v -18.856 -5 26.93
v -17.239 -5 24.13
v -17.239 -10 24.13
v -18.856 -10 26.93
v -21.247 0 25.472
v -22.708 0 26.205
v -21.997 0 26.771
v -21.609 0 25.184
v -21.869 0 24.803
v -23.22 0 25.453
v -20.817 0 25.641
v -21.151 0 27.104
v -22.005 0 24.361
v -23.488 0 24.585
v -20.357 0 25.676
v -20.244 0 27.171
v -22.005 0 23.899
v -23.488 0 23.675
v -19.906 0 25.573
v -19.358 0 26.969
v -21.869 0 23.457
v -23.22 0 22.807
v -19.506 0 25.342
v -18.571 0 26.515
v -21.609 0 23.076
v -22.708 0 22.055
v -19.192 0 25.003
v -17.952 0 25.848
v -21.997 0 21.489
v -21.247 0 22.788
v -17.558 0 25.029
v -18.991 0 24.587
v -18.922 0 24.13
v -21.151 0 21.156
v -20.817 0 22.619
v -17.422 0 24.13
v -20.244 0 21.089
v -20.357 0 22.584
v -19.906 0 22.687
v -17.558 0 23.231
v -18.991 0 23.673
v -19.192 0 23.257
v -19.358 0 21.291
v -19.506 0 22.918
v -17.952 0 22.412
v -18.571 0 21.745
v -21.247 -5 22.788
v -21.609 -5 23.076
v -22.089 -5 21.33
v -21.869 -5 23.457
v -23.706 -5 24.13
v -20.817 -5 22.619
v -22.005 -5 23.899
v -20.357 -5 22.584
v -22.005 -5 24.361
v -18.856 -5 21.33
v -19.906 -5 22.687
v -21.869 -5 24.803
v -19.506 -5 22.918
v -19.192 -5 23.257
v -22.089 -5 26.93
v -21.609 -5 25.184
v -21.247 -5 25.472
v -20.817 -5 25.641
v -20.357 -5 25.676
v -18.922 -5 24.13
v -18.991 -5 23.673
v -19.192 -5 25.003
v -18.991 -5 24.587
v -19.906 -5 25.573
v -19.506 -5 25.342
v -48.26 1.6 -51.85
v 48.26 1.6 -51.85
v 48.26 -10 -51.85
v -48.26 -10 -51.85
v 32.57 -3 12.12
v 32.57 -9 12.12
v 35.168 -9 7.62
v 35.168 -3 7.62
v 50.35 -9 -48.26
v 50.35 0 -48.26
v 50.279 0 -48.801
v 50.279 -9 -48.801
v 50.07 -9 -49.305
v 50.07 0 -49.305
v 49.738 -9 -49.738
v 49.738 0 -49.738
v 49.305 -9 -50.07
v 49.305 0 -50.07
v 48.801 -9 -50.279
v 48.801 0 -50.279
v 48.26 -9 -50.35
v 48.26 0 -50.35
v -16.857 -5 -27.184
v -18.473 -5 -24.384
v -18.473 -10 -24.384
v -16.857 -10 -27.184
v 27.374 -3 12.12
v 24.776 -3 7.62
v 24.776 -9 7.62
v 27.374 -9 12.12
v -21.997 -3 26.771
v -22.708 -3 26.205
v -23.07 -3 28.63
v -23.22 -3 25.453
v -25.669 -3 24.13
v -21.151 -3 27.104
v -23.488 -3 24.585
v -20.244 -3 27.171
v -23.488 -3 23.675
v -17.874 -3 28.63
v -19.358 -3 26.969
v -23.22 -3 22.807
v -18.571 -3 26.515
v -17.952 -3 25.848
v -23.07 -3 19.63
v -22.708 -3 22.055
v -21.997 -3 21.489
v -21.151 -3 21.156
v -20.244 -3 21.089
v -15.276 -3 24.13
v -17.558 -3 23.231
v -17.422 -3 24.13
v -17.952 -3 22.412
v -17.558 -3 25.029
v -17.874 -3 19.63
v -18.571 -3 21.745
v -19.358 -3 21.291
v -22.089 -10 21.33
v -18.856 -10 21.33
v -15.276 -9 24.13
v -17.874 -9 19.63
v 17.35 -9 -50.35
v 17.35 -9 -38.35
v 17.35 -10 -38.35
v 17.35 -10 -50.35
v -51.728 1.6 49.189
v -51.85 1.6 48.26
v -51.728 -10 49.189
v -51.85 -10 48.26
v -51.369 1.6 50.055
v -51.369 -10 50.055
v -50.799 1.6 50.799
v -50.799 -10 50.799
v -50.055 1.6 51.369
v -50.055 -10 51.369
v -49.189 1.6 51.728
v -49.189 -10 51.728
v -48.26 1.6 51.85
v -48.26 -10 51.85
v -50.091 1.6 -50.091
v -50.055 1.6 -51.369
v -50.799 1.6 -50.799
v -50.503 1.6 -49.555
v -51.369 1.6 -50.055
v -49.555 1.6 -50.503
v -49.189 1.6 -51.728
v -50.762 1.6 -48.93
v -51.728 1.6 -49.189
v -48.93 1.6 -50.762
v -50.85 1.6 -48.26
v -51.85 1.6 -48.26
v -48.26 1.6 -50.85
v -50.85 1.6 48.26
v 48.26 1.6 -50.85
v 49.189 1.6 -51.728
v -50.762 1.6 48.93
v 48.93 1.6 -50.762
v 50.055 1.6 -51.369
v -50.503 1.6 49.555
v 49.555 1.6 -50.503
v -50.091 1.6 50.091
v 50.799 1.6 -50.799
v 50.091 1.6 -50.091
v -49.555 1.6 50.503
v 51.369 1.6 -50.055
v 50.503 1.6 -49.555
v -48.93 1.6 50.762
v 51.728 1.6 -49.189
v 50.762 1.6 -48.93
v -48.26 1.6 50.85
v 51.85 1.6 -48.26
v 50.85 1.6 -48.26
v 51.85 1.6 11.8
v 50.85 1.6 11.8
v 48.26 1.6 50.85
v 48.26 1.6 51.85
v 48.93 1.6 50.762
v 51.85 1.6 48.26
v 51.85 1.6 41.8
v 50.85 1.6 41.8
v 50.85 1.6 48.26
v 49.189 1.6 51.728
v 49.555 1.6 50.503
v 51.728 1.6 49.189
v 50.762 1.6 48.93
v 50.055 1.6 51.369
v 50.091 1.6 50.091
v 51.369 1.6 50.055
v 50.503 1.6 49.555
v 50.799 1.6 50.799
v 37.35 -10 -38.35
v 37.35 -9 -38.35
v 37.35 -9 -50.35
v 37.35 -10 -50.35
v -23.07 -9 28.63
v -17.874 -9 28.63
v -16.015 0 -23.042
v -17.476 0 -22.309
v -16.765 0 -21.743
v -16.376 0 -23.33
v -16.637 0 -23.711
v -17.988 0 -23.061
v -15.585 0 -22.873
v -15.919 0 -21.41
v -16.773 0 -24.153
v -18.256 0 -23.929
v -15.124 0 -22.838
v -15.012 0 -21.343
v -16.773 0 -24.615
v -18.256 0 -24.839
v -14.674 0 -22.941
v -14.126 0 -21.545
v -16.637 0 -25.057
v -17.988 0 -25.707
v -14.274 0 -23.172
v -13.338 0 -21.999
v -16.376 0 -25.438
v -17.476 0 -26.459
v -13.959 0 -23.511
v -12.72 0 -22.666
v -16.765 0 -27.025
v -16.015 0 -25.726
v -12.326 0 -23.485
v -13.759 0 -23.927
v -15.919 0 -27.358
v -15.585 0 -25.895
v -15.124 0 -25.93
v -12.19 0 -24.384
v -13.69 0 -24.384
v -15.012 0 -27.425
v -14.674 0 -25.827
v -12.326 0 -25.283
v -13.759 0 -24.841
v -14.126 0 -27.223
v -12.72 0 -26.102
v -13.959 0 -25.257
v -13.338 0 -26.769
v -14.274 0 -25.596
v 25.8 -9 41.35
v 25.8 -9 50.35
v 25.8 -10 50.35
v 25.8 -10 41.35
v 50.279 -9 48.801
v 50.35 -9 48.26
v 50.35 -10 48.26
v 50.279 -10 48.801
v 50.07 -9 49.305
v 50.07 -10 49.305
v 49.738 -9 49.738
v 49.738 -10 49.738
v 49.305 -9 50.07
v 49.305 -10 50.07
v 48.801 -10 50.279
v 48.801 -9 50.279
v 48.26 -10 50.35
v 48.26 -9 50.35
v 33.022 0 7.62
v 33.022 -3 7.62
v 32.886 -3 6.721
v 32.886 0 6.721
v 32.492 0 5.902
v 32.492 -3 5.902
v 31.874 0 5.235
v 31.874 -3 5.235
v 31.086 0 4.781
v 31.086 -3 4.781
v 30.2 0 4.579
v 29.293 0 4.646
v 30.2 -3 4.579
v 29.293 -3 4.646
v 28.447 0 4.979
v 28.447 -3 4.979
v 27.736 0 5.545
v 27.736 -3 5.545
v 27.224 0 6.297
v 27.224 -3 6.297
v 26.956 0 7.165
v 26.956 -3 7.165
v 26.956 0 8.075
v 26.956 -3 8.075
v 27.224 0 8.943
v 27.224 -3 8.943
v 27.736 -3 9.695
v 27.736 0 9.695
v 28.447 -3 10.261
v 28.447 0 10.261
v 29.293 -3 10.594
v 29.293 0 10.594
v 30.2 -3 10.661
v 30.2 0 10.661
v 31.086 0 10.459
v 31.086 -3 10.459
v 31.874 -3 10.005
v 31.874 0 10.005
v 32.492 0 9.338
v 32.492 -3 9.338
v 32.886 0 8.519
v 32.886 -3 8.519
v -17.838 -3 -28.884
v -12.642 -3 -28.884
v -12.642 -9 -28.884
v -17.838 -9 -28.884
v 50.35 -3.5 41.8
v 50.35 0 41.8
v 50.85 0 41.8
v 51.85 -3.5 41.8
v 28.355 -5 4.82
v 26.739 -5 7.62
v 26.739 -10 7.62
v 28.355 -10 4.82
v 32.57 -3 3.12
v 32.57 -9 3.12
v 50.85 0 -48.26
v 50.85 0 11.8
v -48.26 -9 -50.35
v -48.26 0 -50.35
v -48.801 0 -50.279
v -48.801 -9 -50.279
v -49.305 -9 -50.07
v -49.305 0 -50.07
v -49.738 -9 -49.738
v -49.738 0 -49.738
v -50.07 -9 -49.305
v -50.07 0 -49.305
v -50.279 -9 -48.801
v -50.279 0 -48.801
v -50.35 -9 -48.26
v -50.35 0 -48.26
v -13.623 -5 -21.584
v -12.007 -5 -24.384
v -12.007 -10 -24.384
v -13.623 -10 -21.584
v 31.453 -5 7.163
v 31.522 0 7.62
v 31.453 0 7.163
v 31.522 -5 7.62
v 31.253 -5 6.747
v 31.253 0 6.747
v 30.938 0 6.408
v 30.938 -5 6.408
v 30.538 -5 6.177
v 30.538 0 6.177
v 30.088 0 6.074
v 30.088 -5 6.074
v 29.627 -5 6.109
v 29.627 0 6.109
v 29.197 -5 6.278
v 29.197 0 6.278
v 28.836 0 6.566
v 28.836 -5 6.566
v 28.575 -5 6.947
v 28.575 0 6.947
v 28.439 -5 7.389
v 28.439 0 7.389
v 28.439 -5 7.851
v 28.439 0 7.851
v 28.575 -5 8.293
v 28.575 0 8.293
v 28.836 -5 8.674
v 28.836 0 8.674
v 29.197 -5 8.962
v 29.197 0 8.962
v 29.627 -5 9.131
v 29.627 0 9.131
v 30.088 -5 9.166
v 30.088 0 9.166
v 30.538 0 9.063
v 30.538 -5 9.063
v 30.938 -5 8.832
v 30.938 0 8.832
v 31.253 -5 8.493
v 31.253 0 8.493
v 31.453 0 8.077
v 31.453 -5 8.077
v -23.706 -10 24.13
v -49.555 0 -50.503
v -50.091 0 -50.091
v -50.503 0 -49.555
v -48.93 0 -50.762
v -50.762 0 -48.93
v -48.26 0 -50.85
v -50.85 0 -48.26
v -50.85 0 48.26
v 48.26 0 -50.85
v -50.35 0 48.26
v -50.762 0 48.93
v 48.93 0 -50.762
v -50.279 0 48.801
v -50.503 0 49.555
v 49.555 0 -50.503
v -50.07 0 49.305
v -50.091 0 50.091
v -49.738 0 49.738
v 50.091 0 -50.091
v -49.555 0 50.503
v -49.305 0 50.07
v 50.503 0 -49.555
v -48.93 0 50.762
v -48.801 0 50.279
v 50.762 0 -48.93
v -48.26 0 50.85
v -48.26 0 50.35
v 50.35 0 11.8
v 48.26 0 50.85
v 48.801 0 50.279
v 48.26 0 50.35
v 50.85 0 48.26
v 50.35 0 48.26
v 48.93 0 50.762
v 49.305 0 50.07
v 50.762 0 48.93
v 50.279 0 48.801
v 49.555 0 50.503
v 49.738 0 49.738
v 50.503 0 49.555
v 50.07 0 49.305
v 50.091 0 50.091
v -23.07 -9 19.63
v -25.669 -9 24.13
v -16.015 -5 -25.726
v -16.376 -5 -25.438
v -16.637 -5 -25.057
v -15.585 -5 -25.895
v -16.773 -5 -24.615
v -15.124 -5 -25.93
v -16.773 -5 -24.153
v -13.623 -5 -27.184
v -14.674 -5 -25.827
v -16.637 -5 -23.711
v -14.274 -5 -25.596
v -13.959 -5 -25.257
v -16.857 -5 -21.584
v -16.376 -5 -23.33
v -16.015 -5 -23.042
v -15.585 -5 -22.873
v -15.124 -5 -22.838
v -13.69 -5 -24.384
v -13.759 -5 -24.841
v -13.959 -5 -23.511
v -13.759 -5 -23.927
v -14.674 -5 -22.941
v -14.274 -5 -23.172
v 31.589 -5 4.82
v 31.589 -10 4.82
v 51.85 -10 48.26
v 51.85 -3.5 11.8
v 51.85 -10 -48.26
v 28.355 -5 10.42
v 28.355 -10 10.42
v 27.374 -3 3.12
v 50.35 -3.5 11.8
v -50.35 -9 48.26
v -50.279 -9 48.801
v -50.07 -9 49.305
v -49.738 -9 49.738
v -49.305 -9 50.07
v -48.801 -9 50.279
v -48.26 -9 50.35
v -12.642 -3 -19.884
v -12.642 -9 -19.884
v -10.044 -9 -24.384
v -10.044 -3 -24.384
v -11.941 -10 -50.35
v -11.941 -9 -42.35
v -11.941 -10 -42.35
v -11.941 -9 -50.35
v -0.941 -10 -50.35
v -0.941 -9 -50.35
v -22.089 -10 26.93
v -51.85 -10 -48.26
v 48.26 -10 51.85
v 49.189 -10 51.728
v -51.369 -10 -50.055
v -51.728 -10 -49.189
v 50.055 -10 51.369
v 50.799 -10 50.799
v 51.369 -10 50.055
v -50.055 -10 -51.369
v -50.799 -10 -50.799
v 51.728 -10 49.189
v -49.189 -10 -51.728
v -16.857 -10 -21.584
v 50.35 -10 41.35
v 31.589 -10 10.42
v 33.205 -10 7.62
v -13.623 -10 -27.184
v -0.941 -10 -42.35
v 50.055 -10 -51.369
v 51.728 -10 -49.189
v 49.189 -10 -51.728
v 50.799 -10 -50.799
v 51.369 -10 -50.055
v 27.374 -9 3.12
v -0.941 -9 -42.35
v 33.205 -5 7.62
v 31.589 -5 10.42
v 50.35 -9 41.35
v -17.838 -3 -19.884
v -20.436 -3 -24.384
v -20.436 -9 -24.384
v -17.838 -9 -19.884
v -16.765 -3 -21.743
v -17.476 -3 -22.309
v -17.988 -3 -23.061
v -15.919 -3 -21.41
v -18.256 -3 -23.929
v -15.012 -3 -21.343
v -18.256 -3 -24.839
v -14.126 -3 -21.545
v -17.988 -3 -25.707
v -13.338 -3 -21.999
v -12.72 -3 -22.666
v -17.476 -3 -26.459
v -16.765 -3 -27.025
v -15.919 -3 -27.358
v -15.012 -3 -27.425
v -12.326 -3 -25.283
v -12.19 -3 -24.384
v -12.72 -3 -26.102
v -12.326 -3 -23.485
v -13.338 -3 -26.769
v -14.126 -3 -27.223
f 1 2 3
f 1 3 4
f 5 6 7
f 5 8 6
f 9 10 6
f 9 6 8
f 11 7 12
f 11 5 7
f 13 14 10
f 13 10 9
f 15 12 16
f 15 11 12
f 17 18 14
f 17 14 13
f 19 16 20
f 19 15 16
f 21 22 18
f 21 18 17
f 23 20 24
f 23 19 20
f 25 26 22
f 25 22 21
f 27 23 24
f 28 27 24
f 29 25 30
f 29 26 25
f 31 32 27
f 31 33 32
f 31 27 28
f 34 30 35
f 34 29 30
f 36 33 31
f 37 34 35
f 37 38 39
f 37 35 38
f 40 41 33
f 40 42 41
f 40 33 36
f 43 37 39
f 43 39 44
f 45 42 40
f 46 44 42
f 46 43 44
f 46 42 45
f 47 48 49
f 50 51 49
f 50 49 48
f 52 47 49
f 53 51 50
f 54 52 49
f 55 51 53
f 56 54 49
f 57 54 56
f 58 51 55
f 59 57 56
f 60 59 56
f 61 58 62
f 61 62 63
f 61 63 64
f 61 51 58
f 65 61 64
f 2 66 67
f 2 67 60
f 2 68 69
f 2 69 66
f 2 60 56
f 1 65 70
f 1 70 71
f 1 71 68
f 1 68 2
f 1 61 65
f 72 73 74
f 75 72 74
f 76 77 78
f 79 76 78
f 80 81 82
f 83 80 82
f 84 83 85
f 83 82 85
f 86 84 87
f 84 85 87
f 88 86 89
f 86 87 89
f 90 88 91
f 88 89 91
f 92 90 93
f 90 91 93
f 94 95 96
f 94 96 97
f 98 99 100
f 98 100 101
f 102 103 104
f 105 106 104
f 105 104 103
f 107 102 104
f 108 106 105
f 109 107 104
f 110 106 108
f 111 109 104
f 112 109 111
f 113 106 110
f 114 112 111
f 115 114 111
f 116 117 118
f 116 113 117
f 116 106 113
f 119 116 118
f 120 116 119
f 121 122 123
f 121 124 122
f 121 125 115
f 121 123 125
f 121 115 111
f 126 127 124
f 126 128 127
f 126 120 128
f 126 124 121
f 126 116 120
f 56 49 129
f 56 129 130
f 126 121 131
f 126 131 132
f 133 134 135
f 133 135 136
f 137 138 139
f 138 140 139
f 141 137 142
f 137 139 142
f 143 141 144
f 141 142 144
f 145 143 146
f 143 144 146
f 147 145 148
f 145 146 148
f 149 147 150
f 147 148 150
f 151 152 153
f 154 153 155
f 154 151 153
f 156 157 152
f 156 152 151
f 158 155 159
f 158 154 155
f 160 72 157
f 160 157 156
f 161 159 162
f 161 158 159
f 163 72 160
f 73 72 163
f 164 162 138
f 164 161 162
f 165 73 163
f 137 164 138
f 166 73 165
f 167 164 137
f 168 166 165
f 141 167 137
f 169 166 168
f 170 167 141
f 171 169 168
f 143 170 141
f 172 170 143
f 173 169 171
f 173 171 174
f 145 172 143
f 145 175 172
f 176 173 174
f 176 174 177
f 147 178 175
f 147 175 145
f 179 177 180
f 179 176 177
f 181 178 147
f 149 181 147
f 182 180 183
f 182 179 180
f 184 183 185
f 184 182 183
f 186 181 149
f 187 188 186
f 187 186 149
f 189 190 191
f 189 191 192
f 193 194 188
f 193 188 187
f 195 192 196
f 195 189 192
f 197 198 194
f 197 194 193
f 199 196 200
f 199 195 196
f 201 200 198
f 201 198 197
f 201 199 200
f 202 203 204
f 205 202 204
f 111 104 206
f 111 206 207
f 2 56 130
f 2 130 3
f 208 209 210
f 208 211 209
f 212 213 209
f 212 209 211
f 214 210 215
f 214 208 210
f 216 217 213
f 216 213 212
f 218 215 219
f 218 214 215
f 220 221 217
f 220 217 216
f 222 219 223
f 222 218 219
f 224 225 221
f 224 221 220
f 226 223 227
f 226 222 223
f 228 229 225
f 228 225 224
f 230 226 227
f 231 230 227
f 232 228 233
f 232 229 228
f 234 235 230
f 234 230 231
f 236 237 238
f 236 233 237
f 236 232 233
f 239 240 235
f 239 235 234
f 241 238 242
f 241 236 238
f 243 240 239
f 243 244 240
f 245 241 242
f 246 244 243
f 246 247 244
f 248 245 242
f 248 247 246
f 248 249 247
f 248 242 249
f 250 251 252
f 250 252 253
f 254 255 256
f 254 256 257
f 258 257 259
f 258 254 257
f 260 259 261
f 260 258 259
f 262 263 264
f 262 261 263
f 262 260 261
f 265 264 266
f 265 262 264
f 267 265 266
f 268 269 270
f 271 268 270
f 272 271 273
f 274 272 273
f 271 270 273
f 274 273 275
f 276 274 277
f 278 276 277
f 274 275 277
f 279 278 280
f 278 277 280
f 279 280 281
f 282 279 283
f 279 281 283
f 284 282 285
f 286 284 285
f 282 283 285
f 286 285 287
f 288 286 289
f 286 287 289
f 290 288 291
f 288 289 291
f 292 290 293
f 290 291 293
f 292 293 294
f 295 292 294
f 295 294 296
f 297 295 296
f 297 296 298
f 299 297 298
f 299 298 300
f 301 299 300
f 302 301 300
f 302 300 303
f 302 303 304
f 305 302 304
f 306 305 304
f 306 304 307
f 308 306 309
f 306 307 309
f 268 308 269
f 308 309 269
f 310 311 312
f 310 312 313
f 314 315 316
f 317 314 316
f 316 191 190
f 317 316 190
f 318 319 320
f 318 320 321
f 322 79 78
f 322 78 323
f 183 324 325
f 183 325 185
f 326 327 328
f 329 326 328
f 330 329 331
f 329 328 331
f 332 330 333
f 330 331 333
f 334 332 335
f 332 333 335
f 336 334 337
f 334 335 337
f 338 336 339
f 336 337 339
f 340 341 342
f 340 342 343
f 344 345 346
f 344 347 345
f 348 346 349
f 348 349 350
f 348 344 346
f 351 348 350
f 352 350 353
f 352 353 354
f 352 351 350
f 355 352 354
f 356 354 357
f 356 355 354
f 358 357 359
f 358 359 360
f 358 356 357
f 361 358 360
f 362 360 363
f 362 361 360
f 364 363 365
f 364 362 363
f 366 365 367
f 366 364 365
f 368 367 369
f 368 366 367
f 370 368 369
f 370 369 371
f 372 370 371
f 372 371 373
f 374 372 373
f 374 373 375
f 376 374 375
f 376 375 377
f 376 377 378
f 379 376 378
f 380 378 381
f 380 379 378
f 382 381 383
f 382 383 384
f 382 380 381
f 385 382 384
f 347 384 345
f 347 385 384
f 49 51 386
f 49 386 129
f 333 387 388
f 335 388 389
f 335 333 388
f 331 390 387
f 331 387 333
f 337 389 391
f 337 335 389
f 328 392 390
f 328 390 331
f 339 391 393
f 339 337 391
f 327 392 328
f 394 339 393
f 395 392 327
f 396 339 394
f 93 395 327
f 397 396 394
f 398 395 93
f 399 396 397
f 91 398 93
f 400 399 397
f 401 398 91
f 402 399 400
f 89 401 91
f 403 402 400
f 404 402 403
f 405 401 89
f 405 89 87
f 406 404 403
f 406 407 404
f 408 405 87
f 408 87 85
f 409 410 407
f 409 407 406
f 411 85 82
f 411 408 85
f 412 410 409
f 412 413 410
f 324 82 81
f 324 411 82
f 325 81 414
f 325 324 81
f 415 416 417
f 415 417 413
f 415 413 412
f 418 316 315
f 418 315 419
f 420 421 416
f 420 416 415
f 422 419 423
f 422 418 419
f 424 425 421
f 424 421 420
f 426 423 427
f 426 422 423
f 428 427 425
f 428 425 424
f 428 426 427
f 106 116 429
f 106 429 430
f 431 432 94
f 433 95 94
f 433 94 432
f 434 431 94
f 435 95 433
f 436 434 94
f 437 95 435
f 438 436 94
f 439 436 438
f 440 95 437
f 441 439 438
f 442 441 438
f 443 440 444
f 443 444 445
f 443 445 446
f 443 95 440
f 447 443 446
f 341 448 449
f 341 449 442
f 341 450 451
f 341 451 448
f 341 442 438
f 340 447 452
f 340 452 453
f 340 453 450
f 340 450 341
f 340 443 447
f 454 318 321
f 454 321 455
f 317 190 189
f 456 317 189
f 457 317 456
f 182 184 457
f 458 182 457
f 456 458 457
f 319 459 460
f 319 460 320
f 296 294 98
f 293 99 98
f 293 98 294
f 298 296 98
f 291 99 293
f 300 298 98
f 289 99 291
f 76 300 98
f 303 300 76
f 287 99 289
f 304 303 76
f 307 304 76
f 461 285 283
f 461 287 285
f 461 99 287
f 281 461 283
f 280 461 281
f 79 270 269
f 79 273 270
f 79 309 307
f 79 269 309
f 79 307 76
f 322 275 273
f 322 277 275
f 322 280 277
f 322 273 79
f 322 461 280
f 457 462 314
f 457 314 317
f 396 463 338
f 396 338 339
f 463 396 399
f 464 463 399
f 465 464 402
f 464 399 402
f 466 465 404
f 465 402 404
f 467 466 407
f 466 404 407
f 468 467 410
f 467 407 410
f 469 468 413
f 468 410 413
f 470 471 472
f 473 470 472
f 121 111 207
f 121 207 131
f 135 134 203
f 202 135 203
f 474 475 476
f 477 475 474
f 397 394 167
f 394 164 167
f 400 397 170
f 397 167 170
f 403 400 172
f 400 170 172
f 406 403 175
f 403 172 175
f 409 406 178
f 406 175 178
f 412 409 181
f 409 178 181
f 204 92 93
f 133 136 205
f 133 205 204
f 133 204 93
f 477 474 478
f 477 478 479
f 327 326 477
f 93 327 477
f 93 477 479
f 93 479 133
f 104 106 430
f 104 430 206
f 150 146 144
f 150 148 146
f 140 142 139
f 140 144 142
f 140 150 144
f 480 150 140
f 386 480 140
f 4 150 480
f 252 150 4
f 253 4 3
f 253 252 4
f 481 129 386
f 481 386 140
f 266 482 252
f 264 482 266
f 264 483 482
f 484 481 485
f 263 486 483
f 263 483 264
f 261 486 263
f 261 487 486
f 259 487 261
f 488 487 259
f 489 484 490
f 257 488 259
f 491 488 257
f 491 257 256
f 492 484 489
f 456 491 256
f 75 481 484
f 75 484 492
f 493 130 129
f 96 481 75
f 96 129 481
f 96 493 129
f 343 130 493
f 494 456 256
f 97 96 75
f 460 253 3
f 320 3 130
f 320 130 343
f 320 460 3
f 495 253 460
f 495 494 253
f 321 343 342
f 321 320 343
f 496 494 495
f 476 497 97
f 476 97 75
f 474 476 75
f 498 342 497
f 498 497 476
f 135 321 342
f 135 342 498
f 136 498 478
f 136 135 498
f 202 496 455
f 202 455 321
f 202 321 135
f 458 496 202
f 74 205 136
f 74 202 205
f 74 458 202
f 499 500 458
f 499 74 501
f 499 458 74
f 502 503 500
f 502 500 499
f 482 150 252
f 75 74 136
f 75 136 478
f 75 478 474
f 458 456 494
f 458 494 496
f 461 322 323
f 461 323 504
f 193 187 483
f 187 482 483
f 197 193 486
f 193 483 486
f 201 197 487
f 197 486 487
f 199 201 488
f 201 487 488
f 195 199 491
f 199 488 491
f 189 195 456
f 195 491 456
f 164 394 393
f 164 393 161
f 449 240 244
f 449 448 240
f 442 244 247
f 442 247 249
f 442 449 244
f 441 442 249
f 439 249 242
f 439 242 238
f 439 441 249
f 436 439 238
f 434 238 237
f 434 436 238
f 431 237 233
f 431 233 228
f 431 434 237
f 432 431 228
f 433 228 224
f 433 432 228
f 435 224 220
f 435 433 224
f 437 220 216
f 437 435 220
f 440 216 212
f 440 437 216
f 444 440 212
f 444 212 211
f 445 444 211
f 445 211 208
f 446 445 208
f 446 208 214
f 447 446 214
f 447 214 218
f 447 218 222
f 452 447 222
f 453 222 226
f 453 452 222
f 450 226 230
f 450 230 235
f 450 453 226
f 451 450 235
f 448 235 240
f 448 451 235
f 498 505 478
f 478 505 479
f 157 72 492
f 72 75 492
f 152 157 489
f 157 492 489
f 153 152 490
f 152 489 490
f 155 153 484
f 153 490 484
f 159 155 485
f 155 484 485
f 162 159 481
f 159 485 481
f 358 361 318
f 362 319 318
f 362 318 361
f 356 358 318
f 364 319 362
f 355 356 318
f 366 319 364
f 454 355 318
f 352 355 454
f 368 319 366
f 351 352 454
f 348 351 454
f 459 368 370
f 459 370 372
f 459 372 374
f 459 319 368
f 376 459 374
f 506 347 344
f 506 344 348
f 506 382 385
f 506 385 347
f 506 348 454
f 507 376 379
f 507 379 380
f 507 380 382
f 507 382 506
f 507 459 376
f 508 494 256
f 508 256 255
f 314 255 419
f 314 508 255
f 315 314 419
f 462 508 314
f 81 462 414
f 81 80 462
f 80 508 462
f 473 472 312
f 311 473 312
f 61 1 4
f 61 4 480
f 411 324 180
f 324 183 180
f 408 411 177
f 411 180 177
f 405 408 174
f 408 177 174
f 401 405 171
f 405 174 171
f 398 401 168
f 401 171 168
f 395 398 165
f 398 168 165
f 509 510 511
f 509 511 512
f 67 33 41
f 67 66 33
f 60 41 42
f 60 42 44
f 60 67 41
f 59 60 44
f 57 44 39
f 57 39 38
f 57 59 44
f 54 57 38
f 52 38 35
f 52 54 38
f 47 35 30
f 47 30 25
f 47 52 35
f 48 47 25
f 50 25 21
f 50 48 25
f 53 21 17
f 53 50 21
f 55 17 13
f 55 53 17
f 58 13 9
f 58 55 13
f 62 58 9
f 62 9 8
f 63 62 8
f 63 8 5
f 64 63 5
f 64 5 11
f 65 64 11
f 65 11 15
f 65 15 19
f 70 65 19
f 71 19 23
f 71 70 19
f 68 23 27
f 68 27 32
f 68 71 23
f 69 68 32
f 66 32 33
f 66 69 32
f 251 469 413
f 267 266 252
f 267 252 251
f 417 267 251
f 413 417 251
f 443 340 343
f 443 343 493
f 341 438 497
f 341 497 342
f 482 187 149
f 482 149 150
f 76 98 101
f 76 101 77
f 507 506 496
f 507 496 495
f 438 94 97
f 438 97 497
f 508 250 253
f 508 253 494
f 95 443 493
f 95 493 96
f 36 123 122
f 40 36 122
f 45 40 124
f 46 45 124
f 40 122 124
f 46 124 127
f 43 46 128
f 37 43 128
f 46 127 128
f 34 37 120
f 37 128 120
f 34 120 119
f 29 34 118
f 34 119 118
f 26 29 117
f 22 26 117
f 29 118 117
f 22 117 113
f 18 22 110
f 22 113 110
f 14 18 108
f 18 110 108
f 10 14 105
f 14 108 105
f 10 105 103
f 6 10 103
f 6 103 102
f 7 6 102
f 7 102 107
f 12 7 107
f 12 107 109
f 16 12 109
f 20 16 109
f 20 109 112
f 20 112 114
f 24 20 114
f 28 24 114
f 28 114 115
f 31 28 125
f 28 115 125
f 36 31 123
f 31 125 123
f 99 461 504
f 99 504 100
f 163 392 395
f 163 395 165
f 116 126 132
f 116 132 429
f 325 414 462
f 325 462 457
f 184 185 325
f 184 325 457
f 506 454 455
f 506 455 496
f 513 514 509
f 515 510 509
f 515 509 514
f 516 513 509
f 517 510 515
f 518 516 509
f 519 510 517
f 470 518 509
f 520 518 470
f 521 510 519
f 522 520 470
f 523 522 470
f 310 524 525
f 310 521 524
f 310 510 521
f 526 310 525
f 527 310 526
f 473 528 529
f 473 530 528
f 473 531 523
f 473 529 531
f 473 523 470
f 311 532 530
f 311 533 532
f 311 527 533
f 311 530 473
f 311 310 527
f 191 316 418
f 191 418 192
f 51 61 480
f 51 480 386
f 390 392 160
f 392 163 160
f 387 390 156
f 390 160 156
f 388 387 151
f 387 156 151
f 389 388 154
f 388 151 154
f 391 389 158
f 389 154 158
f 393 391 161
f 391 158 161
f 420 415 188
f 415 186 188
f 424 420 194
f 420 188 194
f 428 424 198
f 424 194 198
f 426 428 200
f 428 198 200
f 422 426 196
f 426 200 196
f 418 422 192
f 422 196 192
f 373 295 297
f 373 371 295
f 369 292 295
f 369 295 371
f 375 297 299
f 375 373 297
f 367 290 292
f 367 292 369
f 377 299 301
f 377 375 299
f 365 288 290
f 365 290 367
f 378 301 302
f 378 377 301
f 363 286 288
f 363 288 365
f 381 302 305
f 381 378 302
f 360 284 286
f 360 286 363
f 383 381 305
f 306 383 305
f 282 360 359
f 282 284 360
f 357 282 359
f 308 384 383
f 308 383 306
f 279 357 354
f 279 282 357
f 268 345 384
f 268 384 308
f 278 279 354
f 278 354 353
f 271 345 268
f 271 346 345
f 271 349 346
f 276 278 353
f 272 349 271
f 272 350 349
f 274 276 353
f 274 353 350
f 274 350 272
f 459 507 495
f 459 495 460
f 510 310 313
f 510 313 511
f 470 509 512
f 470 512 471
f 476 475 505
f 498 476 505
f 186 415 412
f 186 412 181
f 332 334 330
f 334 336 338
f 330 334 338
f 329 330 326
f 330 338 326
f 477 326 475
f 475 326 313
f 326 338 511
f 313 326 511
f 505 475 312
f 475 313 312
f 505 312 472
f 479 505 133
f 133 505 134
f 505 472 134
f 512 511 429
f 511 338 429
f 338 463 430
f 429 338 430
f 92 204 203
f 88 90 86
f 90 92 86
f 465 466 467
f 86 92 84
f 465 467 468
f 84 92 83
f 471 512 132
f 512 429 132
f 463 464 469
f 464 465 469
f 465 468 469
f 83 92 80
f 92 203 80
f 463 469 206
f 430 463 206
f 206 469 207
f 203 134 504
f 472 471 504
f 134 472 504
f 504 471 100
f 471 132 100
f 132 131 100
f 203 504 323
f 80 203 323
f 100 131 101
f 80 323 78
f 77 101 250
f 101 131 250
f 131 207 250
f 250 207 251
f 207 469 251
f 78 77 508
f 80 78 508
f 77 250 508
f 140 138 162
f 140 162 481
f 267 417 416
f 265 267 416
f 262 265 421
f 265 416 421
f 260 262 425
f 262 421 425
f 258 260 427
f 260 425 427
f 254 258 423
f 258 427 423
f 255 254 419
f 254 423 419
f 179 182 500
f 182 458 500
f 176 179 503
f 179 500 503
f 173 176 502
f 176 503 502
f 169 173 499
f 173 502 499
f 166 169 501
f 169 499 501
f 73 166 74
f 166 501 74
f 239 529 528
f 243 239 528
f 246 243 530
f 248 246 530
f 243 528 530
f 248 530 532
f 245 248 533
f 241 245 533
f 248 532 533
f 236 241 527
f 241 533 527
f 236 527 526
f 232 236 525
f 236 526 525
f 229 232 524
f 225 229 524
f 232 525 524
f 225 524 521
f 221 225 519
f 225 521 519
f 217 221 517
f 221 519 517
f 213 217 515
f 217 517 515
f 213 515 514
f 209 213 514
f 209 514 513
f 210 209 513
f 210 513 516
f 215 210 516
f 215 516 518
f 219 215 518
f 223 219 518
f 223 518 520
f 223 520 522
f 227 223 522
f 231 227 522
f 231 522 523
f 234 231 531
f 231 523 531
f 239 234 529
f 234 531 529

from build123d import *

# Parameters (mm, degrees)
SKETCH5_R           = 1.55
BOSS_EXTRUDE2_DEPTH = 1
BOSS_EXTRUDE3_START = -3
SKETCH6_R           = 1.55
BOSS_EXTRUDE3_DEPTH = 6
SKETCH11_R          = 3.05
SKETCH11_R_2        = 1.55
BOSS_EXTRUDE4_DEPTH = 3
CUT_EXTRUDE1_START  = 2
CUT_EXTRUDE1_DEPTH  = 6
SKETCH8_W           = 11
SKETCH8_H           = 8
SKETCH8_W_2         = 20
SKETCH8_H_2         = 12
CUT_EXTRUDE2_DEPTH  = 2
SKETCH9_W           = 0.45
SKETCH9_H           = 30
CUT_EXTRUDE3_DEPTH  = 3.5
CUT_EXTRUDE4_REACH  = 105.7
SKETCH10_W          = 30
SKETCH10_H          = 5.1


with BuildPart() as part:
    # Sweep1: sweep along a path in Sketch1
    with BuildLine(Plane(origin=(0, 0, 0), x_dir=(1, 0, 0), z_dir=(0, 1, 0))) as sweep1_path:
        Line((-48.26, -50.8), (48.26, -50.8))
        ThreePointArc((48.26, -50.8), (50.056051224, -50.056051224), (50.8, -48.26))
        Line((50.8, -48.26), (50.8, 48.26))
        ThreePointArc((50.8, 48.26), (50.056051224, 50.056051224), (48.26, 50.8))
        Line((48.26, 50.8), (-48.26, 50.8))
        ThreePointArc((-48.26, 50.8), (-50.056051224, 50.056051224), (-50.8, 48.26))
        Line((-50.8, 48.26), (-50.8, -48.26))
        ThreePointArc((-50.8, -48.26), (-50.056051224, -50.056051224), (-48.26, -50.8))
    # Sketch3 → Sweep1 (sweep)
    with BuildSketch(Plane.XY):
        Polygon((-50.85, 1.6), (-51.85, 1.6), (-51.85, -10), (-50.35, -10), (-50.35, 0), (-50.85, 0), align=None)
    sweep(path=sweep1_path.line)

    # Sketch5 → Boss-Extrude2 (add)
    with BuildSketch(Plane.XZ.offset(10)):
        with BuildLine():
            Line((-50.8, 48.26), (-50.8, -48.26))
            ThreePointArc((-50.8, -48.26), (-50.056051224, -50.056051224), (-48.26, -50.8))
            Line((-48.26, -50.8), (48.26, -50.8))
            ThreePointArc((48.26, -50.8), (50.056051224, -50.056051224), (50.8, -48.26))
            Line((50.8, -48.26), (50.8, 48.26))
            ThreePointArc((50.8, 48.26), (50.056051224, 50.056051224), (48.26, 50.8))
            Line((48.26, 50.8), (-48.26, 50.8))
            ThreePointArc((-48.26, 50.8), (-50.056051224, 50.056051224), (-50.8, 48.26))
        make_face()
        with Locations((-15.24, -24.384)):
            Circle(SKETCH5_R, mode=Mode.SUBTRACT)
        with Locations((29.972, 7.62)):
            Circle(SKETCH5_R, mode=Mode.SUBTRACT)
        with Locations((-20.4724, 24.13)):
            Circle(SKETCH5_R, mode=Mode.SUBTRACT)
    extrude(amount=-BOSS_EXTRUDE2_DEPTH)

    # Sketch6 → Boss-Extrude3 (add)
    with BuildSketch(Plane(origin=(0, 0, 0), x_dir=(1, 0, 0), z_dir=(0, 1, 0)).offset(BOSS_EXTRUDE3_START)):
        Polygon((-10.043847577, 24.384), (-12.641923789, 28.884), (-17.838076211, 28.884), (-20.436152423, 24.384), (-17.838076211, 19.884), (-12.641923789, 19.884), align=None)
        with Locations((-15.24, 24.384)):
            Circle(SKETCH6_R, mode=Mode.SUBTRACT)
        Polygon((35.168152423, -7.62), (32.570076211, -3.12), (27.373923789, -3.12), (24.775847577, -7.62), (27.373923789, -12.12), (32.570076211, -12.12), align=None)
        with Locations((29.972, -7.62)):
            Circle(SKETCH6_R, mode=Mode.SUBTRACT)
        Polygon((-15.276247577, -24.13), (-17.874323789, -19.63), (-23.070476211, -19.63), (-25.668552423, -24.13), (-23.070476211, -28.63), (-17.874323789, -28.63), align=None)
        with Locations((-20.4724, -24.13)):
            Circle(SKETCH6_R, mode=Mode.SUBTRACT)
    extrude(amount=-BOSS_EXTRUDE3_DEPTH)

    # Sketch11 → Boss-Extrude4 (add)
    with BuildSketch(Plane(origin=(0, -3, 0), x_dir=(1, 0, 0), z_dir=(0, 1, 0))):
        with Locations((-15.24, 24.384)):
            Circle(SKETCH11_R)
        with Locations((-15.24, 24.384)):
            Circle(SKETCH11_R_2, mode=Mode.SUBTRACT)
        with Locations((-20.4724, -24.13)):
            Circle(SKETCH11_R)
        with Locations((-20.4724, -24.13)):
            Circle(SKETCH11_R_2, mode=Mode.SUBTRACT)
        with Locations((29.972, -7.62)):
            Circle(SKETCH11_R)
        with Locations((29.972, -7.62)):
            Circle(SKETCH11_R_2, mode=Mode.SUBTRACT)
    extrude(amount=BOSS_EXTRUDE4_DEPTH)

    # Sketch7 → Cut-Extrude1 (cut, through all)
    with BuildSketch(Plane.XZ.offset(3).offset(CUT_EXTRUDE1_START)):
        Polygon((-17.239238493, 24.13), (-18.855819246, 26.93), (-22.088980754, 26.93), (-23.705561507, 24.13), (-22.088980754, 21.33), (-18.855819246, 21.33), align=None)
        Polygon((33.205161507, 7.62), (31.588580754, 10.42), (28.355419246, 10.42), (26.738838493, 7.62), (28.355419246, 4.82), (31.588580754, 4.82), align=None)
        Polygon((-12.006838493, -24.384), (-13.623419246, -21.584), (-16.856580754, -21.584), (-18.473161507, -24.384), (-16.856580754, -27.184), (-13.623419246, -27.184), align=None)
    extrude(amount=CUT_EXTRUDE1_DEPTH, mode=Mode.SUBTRACT)

    # Sketch8 → Cut-Extrude2 (cut, through all)
    with BuildSketch(Plane(origin=(0, -9, 0), x_dir=(1, 0, 0), z_dir=(0, 1, 0))):
        with Locations((-6.4408, 46.35)):
            Rectangle(SKETCH8_W, SKETCH8_H)
        with BuildLine():
            Line((50.35, -41.35), (50.35, -48.26))
            ThreePointArc((50.35, -48.26), (49.737853173, -49.737853173), (48.26, -50.35))
            Line((48.26, -50.35), (25.8, -50.35))
            Line((25.8, -50.35), (25.8, -41.35))
            Line((25.8, -41.35), (50.35, -41.35))
        make_face()
        with Locations((27.35, 44.35)):
            Rectangle(SKETCH8_W_2, SKETCH8_H_2)
    extrude(amount=-CUT_EXTRUDE2_DEPTH, mode=Mode.SUBTRACT)

    # Sketch9 → Cut-Extrude3 (cut)
    with BuildSketch(Plane(origin=(0, 0, 0), x_dir=(1, 0, 0), z_dir=(0, 1, 0))):
        with Locations((50.575, -26.8)):
            Rectangle(SKETCH9_W, SKETCH9_H)
    extrude(amount=-CUT_EXTRUDE3_DEPTH, mode=Mode.SUBTRACT)

    # Sketch10 → Cut-Extrude4 (cut, up to next)
    with BuildSketch(Plane(origin=(51.85, 0, 0), x_dir=(0, 0, -1), z_dir=(1, 0, 0)), mode=Mode.PRIVATE) as cut_extrude4_sk1:
        with Locations((-26.8, -0.95)):
            Rectangle(SKETCH10_W, SKETCH10_H)
    cut_extrude4_tool1 = extrude(cut_extrude4_sk1.sketch, amount=-CUT_EXTRUDE4_REACH, mode=Mode.PRIVATE) & part.part
    add(cut_extrude4_tool1.solids().sort_by_distance((51.85, -0.95, 26.8))[0], mode=Mode.SUBTRACT)


solid = part.part
